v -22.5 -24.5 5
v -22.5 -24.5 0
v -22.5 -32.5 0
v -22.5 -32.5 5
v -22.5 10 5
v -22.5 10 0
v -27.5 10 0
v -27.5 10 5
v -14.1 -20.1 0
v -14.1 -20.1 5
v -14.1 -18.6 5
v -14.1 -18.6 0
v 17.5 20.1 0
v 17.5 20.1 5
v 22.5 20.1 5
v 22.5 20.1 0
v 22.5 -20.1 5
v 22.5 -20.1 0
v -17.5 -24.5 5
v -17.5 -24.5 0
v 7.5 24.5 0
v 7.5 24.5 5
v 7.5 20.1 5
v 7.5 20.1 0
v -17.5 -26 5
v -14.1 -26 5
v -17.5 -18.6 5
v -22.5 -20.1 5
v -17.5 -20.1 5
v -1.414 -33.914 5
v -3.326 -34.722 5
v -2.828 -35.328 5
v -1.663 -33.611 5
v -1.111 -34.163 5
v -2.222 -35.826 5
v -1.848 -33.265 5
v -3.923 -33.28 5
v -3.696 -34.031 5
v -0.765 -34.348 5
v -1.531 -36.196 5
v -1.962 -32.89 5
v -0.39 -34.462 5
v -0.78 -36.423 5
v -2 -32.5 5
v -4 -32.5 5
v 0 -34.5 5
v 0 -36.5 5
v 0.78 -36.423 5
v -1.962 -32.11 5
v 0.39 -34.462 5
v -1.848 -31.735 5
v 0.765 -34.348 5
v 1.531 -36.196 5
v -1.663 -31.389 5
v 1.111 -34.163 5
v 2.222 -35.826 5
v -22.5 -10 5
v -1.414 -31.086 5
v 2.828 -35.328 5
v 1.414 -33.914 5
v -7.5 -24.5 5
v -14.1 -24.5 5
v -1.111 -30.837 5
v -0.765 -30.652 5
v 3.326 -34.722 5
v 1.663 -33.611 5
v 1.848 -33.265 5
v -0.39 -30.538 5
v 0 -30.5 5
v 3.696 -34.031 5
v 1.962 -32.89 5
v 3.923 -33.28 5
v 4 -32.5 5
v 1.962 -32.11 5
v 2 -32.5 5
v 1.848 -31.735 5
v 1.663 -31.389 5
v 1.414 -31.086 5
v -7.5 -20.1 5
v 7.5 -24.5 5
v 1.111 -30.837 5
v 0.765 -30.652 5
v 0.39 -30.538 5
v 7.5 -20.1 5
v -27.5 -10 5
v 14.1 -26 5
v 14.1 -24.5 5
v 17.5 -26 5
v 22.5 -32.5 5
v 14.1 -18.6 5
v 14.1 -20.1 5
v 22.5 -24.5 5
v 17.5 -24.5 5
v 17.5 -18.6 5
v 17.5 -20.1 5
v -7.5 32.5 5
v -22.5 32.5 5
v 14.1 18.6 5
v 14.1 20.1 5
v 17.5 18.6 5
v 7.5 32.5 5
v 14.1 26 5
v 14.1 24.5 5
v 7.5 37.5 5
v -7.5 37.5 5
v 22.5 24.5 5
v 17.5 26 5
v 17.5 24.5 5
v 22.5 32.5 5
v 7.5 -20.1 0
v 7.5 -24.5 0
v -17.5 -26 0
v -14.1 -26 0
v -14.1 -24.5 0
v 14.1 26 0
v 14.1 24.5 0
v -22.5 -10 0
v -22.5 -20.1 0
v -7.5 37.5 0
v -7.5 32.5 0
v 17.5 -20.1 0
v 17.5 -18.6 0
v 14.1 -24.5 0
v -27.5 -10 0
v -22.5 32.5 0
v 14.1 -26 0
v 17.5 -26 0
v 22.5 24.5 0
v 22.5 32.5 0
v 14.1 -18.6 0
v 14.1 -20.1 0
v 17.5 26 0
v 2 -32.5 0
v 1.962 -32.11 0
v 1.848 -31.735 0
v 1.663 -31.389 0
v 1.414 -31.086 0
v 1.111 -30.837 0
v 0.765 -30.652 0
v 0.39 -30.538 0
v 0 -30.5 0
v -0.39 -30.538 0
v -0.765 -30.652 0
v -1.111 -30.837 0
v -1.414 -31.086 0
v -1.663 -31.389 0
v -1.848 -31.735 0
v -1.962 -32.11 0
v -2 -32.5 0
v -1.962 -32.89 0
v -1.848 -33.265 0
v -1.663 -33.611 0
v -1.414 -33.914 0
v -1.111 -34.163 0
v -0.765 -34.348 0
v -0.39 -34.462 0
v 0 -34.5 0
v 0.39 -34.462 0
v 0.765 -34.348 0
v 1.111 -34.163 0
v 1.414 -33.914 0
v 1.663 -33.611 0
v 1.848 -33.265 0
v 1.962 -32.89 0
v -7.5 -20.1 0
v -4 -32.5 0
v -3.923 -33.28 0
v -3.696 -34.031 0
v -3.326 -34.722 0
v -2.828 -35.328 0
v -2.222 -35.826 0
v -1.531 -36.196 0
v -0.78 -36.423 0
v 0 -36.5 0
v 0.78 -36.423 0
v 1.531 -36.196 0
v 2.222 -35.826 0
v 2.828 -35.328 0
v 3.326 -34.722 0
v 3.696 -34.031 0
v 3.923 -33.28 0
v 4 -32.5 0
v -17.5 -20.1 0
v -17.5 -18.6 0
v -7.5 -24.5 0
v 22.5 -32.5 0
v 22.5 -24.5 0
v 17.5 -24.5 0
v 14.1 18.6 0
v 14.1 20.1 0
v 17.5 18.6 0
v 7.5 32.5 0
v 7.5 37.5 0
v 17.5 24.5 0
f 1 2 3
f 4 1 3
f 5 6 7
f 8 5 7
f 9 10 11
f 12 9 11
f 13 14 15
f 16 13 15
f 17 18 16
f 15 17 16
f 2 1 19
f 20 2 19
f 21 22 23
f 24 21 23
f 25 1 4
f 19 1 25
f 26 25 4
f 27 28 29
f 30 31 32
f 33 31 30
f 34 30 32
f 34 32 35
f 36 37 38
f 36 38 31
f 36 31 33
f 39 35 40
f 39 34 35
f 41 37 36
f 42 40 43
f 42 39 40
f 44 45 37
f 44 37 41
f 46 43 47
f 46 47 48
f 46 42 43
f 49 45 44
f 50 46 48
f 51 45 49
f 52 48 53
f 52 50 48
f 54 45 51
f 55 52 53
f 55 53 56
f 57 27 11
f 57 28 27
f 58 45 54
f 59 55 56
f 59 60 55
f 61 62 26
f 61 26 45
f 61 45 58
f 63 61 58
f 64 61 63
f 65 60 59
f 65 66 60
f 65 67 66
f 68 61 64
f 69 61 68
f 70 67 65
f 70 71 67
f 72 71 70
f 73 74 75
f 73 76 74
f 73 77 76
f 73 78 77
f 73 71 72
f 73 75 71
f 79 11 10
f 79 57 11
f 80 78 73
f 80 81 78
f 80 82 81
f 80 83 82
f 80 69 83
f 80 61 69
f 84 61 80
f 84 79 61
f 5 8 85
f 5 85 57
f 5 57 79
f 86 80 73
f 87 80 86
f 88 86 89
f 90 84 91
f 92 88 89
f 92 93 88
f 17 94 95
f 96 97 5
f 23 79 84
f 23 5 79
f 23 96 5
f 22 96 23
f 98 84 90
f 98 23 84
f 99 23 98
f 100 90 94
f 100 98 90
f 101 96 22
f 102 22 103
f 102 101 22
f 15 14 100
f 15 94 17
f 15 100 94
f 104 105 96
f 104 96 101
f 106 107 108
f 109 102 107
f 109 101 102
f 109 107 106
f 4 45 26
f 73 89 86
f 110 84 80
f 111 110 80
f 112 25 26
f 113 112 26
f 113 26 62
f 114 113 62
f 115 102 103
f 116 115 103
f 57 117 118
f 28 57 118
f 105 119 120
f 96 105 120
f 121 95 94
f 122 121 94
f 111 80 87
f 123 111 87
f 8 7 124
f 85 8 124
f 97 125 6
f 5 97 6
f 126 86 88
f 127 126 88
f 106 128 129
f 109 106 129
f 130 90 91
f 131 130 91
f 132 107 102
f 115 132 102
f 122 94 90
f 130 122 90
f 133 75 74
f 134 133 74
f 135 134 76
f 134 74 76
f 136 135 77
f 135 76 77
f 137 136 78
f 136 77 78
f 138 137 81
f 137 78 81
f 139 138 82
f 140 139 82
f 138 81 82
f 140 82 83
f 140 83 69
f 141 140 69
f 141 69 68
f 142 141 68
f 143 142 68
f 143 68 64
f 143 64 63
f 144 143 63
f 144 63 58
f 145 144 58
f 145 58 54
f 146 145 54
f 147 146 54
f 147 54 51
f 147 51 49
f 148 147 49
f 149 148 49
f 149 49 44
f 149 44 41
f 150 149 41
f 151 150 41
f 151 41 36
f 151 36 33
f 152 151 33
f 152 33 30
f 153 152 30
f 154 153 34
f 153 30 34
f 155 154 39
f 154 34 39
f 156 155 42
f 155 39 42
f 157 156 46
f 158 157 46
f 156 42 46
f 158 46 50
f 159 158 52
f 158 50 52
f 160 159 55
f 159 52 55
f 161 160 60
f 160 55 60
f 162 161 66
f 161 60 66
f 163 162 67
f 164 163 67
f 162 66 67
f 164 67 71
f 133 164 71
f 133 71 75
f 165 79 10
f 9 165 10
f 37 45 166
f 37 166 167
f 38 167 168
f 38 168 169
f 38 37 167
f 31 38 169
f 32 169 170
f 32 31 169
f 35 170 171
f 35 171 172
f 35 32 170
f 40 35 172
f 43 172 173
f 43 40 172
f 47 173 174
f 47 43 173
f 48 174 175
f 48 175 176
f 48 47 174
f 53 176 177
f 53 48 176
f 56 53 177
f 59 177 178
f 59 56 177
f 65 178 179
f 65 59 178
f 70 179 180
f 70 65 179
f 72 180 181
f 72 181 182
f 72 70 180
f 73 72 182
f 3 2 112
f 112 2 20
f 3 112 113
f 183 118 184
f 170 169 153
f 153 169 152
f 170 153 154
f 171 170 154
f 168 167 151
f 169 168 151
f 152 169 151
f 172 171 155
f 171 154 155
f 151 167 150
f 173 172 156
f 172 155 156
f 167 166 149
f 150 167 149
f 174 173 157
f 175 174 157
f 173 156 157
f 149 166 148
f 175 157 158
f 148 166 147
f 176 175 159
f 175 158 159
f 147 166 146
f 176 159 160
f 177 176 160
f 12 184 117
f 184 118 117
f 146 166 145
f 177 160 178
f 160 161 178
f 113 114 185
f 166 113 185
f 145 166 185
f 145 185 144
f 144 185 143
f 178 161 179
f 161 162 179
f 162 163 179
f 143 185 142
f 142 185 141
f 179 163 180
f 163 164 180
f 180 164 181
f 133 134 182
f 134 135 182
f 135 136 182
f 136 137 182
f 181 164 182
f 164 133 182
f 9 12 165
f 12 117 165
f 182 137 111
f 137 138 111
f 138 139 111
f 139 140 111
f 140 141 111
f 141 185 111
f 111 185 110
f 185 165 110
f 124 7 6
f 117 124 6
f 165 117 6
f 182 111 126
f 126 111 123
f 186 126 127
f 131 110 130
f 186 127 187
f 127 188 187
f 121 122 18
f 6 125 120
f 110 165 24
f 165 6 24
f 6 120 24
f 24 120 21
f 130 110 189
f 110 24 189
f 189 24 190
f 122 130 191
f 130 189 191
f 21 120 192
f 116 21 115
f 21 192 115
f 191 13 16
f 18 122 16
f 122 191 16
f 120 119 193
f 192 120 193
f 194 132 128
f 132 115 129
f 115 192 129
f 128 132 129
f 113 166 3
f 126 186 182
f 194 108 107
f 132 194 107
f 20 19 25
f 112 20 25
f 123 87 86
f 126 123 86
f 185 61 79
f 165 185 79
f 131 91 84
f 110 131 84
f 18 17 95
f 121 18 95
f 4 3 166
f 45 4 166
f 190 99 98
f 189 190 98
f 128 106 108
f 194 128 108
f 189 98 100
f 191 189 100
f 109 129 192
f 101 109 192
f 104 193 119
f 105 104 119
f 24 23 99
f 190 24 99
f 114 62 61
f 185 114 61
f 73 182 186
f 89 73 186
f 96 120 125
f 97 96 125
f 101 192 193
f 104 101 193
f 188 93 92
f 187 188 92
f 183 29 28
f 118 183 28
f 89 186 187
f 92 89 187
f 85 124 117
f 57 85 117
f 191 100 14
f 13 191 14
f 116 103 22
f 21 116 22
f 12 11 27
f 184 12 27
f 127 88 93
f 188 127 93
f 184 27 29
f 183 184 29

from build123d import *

# Parameters (mm, degrees)
BOSS_EXTRUDE1_DEPTH = 5
CUT_EXTRUDE1_DEPTH  = 5
SKETCH10_R          = 4
SKETCH10_R_2        = 2
BOSS_EXTRUDE3_DEPTH = 5
SKETCH11_R          = 2
CUT_EXTRUDE3_DEPTH  = 5


with BuildPart() as part:
    # Sketch1 → Boss-Extrude1 (new body)
    with BuildSketch(Plane.XY):
        Polygon((7.5, 32.5), (7.5, 37.5), (-7.5, 37.5), (-7.5, 32.5), (-22.5, 32.5), (-22.5, 10), (-27.5, 10), (-27.5, -10), (-22.5, -10), (-22.5, -32.5), (22.5, -32.5), (22.5, 32.5), align=None)
    extrude(amount=BOSS_EXTRUDE1_DEPTH)

    # Sketch3 → Cut-Extrude1 (cut)
    with BuildSketch(Plane.XY.offset(5)):
        Polygon((22.5, 24.5), (17.5, 24.5), (17.5, 26), (14.1, 26), (14.1, 24.5), (7.5, 24.5), (7.5, 20.1), (14.1, 20.1), (14.1, 18.6), (17.5, 18.6), (17.5, 20.1), (22.5, 20.1), align=None)
        Polygon((22.5, -24.5), (22.5, -20.1), (17.5, -20.1), (17.5, -18.6), (14.1, -18.6), (14.1, -20.1), (7.5, -20.1), (7.5, -24.5), (14.1, -24.5), (14.1, -26), (17.5, -26), (17.5, -24.5), align=None)
        Polygon((-22.5, -24.5), (-17.5, -24.5), (-17.5, -26), (-14.1, -26), (-14.1, -24.5), (-7.5, -24.5), (-7.5, -20.1), (-14.1, -20.1), (-14.1, -18.6), (-17.5, -18.6), (-17.5, -20.1), (-22.5, -20.1), align=None)
    extrude(amount=-CUT_EXTRUDE1_DEPTH, mode=Mode.SUBTRACT)

    # Sketch10 → Boss-Extrude3 (add)
    with BuildSketch(Plane.XY.offset(5)):
        with Locations((0, -32.5)):
            Circle(SKETCH10_R)
        with Locations((0, -32.5)):
            Circle(SKETCH10_R_2, mode=Mode.SUBTRACT)
    extrude(amount=-BOSS_EXTRUDE3_DEPTH)

    # Sketch11 → Cut-Extrude3 (cut)
    with BuildSketch(Plane.XY.offset(5)):
        with Locations((0, -32.5)):
            Circle(SKETCH11_R)
    extrude(amount=-CUT_EXTRUDE3_DEPTH, mode=Mode.SUBTRACT)


solid = part.part
